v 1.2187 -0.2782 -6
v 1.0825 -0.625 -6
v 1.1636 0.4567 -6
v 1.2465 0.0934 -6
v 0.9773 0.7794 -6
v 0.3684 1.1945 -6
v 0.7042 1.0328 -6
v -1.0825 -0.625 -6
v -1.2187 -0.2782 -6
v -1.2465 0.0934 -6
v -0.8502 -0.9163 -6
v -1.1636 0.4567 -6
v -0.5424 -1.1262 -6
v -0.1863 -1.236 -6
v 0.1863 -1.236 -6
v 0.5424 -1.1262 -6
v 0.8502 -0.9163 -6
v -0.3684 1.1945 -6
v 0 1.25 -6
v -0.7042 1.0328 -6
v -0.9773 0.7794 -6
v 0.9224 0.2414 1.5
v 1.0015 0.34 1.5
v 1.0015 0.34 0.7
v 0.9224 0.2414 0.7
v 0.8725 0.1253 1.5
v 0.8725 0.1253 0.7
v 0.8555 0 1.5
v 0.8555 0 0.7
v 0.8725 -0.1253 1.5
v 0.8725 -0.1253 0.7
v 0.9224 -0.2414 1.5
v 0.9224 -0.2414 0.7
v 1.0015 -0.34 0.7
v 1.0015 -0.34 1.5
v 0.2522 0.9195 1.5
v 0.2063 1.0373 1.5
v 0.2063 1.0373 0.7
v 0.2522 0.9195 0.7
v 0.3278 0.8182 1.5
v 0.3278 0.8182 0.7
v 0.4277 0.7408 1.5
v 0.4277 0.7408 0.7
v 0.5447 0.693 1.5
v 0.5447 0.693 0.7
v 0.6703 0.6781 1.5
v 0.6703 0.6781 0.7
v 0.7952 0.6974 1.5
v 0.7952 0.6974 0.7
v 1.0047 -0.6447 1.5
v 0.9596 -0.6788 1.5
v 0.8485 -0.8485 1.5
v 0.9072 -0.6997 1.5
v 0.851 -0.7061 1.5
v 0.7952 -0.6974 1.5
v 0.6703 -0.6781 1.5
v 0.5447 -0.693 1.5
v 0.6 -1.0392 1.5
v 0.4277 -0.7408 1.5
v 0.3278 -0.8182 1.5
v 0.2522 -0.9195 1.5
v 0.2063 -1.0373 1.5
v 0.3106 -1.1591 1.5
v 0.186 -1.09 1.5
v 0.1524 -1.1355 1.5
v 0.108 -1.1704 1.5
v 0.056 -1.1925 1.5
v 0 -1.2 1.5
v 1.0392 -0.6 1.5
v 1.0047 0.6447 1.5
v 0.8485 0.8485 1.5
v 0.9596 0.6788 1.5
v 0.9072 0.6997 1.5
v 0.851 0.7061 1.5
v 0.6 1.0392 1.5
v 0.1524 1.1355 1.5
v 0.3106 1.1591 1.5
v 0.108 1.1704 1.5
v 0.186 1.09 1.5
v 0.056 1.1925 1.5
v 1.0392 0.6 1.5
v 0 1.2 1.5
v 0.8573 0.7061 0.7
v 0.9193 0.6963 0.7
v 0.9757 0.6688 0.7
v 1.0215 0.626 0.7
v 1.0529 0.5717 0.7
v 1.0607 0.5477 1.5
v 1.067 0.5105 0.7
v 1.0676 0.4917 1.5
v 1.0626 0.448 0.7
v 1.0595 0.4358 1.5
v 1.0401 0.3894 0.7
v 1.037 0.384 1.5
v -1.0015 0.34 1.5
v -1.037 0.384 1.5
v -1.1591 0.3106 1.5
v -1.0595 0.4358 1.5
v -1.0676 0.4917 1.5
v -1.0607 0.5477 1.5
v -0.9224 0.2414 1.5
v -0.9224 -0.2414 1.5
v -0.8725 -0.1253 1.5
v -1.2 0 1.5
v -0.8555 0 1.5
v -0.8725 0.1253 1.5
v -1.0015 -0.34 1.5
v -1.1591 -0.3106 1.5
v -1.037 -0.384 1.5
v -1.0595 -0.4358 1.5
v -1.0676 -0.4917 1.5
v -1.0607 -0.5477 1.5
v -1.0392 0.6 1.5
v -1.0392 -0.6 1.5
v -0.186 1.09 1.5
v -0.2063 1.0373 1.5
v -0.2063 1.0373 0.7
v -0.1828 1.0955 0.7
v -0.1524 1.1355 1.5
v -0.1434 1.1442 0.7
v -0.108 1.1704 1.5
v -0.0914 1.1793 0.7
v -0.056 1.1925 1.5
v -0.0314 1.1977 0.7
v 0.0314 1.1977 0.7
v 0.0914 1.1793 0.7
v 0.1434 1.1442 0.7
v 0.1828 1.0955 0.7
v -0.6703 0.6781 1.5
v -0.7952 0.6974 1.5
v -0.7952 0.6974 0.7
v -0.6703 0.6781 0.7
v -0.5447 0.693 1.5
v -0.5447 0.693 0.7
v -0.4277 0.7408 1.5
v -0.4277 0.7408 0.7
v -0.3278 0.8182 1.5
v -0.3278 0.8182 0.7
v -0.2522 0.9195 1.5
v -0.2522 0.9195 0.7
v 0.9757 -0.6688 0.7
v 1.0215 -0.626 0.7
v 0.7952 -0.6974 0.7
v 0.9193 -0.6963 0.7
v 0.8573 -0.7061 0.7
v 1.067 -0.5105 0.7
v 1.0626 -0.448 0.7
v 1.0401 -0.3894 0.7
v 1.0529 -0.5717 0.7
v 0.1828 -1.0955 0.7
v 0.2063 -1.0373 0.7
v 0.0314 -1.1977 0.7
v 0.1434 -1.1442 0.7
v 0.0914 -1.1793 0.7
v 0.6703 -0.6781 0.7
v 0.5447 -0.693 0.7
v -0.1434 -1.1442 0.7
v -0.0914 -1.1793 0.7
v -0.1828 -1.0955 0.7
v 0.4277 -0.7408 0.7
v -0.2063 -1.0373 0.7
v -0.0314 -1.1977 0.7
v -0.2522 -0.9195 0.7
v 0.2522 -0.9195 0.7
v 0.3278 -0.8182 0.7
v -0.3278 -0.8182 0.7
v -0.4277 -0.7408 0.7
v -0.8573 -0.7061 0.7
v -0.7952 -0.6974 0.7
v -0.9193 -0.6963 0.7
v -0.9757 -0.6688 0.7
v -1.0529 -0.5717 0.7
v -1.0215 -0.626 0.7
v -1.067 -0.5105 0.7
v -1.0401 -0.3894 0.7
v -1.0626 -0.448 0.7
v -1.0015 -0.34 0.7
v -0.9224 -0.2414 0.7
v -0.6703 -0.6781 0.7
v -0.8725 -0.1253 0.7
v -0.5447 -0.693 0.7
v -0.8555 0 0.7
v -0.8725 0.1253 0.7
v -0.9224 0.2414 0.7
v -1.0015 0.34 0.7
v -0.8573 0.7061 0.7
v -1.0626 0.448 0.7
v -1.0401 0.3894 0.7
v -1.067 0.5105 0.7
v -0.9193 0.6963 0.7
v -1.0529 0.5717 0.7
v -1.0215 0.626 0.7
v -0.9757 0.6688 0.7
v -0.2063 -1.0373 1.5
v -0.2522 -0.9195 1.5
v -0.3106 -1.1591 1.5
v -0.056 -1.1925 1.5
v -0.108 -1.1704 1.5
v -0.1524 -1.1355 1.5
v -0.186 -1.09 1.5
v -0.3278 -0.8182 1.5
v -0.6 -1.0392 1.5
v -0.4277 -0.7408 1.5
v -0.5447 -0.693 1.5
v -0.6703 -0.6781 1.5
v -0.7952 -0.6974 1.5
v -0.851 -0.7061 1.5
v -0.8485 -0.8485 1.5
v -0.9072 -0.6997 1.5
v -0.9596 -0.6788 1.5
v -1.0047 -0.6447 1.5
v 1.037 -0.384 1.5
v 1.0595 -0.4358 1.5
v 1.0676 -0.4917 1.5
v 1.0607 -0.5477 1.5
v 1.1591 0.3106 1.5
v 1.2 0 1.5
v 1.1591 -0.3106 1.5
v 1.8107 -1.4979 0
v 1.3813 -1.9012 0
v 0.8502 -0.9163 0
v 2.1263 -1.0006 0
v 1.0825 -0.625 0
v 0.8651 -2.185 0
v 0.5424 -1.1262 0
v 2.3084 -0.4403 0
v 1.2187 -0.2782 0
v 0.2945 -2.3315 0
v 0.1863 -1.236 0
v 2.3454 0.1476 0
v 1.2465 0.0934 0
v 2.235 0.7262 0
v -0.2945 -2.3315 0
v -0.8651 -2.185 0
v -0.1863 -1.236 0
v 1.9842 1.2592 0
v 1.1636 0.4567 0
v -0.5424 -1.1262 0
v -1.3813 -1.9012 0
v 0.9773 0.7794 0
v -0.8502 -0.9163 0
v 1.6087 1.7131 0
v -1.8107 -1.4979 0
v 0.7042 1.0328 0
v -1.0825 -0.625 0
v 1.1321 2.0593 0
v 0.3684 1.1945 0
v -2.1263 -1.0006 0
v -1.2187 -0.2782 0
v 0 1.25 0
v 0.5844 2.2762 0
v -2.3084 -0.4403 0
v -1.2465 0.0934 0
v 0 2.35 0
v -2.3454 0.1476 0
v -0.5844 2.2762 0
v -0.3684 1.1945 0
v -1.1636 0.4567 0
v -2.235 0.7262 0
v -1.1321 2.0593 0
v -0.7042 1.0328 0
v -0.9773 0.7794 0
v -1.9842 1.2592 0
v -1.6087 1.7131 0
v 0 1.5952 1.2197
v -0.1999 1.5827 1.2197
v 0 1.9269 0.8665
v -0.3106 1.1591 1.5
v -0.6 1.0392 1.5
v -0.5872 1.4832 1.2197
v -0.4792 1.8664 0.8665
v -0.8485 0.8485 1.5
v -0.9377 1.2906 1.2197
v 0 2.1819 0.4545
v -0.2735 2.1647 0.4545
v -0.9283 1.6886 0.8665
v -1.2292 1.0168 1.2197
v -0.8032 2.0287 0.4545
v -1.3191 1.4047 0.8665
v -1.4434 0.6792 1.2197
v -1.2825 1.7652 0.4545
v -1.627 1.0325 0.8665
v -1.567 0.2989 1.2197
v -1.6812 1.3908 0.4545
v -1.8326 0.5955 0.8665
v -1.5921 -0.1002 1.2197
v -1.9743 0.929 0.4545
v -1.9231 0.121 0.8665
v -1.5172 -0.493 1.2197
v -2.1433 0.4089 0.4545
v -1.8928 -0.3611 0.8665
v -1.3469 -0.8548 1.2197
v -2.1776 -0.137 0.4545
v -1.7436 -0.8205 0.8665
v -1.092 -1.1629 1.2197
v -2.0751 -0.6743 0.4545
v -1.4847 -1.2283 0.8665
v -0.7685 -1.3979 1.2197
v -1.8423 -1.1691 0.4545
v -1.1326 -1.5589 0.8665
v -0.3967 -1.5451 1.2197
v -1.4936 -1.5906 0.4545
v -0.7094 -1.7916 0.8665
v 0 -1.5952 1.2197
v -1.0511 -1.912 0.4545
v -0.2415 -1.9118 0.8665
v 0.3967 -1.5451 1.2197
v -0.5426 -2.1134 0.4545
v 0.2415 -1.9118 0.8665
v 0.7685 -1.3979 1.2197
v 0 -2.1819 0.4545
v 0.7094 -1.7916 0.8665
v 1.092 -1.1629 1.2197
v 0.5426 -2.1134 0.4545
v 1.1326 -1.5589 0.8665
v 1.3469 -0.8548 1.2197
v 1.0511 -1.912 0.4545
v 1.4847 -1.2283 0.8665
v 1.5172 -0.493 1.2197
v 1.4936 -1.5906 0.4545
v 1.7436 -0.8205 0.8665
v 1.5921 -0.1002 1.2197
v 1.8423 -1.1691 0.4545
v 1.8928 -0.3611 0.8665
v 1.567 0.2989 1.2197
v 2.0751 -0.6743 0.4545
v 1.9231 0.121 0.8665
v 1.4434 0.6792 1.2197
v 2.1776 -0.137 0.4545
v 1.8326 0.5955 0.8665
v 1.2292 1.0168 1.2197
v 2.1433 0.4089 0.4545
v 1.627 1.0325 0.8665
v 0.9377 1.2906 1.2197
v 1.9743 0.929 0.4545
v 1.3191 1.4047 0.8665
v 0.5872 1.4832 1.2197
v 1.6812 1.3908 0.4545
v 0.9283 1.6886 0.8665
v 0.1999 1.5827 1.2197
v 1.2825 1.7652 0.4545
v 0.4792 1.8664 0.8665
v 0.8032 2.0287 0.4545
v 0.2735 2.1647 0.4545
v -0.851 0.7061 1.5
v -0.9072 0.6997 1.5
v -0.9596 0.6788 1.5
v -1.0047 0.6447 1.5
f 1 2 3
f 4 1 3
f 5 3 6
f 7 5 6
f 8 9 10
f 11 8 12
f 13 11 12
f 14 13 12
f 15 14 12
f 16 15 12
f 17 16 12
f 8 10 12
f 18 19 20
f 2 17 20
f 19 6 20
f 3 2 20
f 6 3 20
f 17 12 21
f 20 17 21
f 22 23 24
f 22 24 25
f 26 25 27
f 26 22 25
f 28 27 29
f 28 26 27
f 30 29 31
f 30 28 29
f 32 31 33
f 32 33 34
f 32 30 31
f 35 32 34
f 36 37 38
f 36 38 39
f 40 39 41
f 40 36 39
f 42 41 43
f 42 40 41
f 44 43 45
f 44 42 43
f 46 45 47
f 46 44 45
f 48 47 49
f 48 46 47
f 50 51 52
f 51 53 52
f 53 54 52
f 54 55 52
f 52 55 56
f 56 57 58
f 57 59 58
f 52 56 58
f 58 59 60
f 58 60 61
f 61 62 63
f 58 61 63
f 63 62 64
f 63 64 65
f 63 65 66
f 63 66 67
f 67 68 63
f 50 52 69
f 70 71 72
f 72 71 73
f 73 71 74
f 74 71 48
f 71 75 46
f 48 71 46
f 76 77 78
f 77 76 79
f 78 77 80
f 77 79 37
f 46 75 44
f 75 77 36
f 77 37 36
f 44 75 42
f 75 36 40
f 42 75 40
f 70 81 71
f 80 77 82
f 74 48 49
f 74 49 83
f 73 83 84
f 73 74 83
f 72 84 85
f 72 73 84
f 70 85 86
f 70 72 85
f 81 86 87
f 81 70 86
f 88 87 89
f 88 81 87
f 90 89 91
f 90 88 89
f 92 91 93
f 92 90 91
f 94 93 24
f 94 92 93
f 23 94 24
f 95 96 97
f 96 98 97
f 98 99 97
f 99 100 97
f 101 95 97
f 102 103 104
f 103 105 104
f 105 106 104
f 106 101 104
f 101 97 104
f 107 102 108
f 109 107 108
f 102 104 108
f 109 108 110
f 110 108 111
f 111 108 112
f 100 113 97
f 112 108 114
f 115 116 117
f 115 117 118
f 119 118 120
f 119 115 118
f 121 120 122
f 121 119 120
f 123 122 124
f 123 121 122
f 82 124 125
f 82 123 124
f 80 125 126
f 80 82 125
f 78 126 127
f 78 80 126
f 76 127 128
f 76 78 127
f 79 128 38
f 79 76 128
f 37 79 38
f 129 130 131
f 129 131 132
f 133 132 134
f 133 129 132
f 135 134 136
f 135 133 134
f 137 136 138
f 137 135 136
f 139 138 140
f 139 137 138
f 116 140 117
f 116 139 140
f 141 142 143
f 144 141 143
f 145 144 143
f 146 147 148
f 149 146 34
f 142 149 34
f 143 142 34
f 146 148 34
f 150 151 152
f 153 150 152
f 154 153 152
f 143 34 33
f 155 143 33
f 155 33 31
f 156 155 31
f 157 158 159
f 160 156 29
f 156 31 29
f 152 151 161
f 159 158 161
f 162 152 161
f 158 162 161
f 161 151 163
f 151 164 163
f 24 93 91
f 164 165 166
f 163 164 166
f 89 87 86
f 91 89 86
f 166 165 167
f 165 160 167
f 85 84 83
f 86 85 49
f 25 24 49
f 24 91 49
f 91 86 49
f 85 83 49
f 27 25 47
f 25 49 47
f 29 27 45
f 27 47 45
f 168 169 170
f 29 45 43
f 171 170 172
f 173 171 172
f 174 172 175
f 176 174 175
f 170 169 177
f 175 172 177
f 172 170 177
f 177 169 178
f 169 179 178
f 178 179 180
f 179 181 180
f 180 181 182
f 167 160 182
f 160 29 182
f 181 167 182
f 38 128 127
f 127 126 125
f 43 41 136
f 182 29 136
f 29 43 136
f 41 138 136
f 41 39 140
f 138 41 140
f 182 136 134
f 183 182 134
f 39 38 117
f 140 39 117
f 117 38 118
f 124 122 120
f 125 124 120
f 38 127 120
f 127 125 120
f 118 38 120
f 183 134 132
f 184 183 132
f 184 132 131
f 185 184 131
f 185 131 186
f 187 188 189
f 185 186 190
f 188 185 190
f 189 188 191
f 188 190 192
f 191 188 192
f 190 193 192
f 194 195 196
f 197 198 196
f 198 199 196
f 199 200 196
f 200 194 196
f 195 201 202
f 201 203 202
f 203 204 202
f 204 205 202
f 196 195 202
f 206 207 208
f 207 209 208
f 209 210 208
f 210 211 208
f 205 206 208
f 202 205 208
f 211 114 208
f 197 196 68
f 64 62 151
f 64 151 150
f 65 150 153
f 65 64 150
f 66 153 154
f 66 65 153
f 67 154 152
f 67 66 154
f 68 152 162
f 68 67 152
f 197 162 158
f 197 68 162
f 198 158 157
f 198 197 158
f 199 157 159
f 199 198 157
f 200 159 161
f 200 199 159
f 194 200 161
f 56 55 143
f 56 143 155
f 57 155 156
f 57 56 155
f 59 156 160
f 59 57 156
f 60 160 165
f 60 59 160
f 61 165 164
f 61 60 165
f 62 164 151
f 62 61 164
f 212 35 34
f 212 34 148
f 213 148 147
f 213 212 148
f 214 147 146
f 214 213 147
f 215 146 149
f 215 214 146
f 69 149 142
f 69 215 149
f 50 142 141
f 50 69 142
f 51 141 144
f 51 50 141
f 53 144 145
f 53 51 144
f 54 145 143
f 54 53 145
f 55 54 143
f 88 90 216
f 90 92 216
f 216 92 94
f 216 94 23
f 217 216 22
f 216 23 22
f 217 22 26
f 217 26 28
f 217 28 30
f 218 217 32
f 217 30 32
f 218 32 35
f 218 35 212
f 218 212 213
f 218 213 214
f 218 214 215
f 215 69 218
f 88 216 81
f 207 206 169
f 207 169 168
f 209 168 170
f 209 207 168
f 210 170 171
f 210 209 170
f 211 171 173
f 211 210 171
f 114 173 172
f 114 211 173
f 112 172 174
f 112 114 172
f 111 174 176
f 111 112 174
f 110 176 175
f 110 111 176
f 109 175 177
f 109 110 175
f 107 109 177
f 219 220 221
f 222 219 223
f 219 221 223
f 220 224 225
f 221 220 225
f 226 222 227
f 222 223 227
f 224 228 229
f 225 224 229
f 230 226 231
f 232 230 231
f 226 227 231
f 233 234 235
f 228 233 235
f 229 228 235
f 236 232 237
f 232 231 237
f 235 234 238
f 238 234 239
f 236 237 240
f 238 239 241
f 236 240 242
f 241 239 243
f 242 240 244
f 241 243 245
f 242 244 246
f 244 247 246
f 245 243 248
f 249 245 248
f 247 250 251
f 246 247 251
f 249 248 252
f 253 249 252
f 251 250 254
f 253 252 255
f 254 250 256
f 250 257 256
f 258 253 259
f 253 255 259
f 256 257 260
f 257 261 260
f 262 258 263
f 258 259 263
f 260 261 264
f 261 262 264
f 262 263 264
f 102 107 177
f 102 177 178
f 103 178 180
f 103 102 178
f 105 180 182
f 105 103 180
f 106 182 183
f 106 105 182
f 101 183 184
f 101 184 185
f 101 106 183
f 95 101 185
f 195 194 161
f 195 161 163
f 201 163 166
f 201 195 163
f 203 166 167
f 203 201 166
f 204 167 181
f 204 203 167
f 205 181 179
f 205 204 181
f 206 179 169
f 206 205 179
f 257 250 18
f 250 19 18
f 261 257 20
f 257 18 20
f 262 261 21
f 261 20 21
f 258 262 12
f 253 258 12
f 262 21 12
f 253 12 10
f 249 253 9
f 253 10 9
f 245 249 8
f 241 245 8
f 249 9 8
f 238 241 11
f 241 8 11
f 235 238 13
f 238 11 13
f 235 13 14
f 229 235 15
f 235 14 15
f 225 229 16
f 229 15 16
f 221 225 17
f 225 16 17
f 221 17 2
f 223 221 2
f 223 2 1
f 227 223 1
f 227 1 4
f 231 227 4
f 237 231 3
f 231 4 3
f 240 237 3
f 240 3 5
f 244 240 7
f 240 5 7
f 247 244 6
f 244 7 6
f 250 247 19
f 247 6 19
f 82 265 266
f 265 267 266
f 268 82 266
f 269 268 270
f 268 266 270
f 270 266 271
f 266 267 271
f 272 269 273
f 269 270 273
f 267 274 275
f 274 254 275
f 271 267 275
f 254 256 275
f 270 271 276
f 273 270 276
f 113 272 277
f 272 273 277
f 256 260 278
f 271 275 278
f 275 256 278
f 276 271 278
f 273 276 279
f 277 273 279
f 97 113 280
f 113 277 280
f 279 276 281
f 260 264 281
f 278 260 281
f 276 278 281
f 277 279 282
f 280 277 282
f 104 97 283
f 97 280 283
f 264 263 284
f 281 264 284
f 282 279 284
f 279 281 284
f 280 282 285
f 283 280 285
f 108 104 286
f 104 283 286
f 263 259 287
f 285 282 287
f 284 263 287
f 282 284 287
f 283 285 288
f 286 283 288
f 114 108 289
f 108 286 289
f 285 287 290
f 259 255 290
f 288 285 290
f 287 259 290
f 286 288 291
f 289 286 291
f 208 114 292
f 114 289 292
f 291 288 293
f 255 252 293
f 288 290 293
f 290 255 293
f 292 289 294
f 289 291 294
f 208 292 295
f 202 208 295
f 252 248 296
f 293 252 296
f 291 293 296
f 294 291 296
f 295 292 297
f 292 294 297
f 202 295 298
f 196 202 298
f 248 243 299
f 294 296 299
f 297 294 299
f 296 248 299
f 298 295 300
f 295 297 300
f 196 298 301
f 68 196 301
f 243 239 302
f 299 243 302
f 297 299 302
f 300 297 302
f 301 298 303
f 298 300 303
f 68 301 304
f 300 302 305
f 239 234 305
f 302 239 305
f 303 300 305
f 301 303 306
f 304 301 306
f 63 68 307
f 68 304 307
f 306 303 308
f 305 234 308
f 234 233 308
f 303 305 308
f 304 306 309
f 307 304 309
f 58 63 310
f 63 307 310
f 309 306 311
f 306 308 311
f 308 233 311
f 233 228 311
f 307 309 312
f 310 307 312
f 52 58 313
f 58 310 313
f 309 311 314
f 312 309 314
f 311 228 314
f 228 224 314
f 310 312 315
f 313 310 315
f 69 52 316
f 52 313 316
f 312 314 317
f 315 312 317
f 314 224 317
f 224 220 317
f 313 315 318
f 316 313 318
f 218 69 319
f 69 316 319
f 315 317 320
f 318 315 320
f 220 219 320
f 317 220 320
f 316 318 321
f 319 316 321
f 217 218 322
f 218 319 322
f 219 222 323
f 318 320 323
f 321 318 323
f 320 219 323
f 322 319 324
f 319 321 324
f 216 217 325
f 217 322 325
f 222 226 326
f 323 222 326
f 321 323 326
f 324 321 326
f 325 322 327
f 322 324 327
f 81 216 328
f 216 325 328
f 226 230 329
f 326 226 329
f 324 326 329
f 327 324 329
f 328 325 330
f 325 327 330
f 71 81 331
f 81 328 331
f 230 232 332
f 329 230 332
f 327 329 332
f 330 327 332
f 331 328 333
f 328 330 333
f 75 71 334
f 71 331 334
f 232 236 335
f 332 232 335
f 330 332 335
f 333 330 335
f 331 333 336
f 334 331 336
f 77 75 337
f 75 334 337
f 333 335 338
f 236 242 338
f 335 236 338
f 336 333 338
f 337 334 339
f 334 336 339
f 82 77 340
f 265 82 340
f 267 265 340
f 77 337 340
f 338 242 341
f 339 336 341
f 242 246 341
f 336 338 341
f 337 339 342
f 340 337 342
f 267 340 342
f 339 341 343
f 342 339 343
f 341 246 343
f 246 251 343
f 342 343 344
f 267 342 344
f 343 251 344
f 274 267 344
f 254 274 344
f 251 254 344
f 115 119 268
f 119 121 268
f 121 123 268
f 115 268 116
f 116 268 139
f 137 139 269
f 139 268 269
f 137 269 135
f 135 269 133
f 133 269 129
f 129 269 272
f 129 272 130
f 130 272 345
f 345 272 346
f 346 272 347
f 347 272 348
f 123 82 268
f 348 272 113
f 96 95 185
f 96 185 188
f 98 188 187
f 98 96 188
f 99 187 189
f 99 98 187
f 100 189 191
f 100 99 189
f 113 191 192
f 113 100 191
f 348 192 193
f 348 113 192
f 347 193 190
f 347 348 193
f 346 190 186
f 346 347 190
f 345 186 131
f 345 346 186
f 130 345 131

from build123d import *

# Parameters (mm, degrees)
ENL_V_MAT_EXTRU_1_DEPTH = 0.8


with BuildPart() as part:
    # Esquisse1 → Révolution1 (revolve)
    with BuildSketch(Plane(origin=(0, 0, 0), x_dir=(0, 0, -1), z_dir=(1, 0, 0))):
        with BuildLine():
            Line((-1.5, 0), (-1.5, 1.2))
            ThreePointArc((-1.5, 1.2), (-0.866492752, 1.926947067), (0, 2.35))
            Line((0, 2.35), (0, 1.25))
            Line((0, 1.25), (6, 1.25))
            Line((6, 1.25), (6, 0))
            Line((6, 0), (-1.5, 0))
        make_face()
    revolve(axis=Axis((0, 0, 1.5), (0, 0, 1)))

    # Esquisse2 → Enlèv. mat.-Extru.1 (cut)
    with BuildSketch(Plane.XY.offset(1.5)):
        with BuildLine():
            ThreePointArc((-0.206338407, 1.037333225), (0, 1.2), (0.206338407, 1.037333225))
            ThreePointArc((0.206338407, 1.037333225), (0.427729629, 0.74084945), (0.795187721, 0.697360915))
            ThreePointArc((0.795187721, 0.697360915), (1.039230485, 0.6), (1.001526129, 0.33997231))
            ThreePointArc((1.001526129, 0.33997231), (0.855459258, 0), (1.001526129, -0.33997231))
            ThreePointArc((1.001526129, -0.33997231), (1.039230485, -0.6), (0.795187721, -0.697360915))
            ThreePointArc((0.795187721, -0.697360915), (0.427729629, -0.74084945), (0.206338407, -1.037333225))
            ThreePointArc((0.206338407, -1.037333225), (0, -1.2), (-0.206338407, -1.037333225))
            ThreePointArc((-0.206338407, -1.037333225), (-0.427729629, -0.74084945), (-0.795187721, -0.697360915))
            ThreePointArc((-0.795187721, -0.697360915), (-1.039230485, -0.6), (-1.001526129, -0.33997231))
            ThreePointArc((-1.001526129, -0.33997231), (-0.855459258, 0), (-1.001526129, 0.33997231))
            ThreePointArc((-1.001526129, 0.33997231), (-1.039230485, 0.6), (-0.795187721, 0.697360915))
            ThreePointArc((-0.795187721, 0.697360915), (-0.427729629, 0.74084945), (-0.206338407, 1.037333225))
        make_face()
    extrude(amount=-ENL_V_MAT_EXTRU_1_DEPTH, mode=Mode.SUBTRACT)


solid = part.part
